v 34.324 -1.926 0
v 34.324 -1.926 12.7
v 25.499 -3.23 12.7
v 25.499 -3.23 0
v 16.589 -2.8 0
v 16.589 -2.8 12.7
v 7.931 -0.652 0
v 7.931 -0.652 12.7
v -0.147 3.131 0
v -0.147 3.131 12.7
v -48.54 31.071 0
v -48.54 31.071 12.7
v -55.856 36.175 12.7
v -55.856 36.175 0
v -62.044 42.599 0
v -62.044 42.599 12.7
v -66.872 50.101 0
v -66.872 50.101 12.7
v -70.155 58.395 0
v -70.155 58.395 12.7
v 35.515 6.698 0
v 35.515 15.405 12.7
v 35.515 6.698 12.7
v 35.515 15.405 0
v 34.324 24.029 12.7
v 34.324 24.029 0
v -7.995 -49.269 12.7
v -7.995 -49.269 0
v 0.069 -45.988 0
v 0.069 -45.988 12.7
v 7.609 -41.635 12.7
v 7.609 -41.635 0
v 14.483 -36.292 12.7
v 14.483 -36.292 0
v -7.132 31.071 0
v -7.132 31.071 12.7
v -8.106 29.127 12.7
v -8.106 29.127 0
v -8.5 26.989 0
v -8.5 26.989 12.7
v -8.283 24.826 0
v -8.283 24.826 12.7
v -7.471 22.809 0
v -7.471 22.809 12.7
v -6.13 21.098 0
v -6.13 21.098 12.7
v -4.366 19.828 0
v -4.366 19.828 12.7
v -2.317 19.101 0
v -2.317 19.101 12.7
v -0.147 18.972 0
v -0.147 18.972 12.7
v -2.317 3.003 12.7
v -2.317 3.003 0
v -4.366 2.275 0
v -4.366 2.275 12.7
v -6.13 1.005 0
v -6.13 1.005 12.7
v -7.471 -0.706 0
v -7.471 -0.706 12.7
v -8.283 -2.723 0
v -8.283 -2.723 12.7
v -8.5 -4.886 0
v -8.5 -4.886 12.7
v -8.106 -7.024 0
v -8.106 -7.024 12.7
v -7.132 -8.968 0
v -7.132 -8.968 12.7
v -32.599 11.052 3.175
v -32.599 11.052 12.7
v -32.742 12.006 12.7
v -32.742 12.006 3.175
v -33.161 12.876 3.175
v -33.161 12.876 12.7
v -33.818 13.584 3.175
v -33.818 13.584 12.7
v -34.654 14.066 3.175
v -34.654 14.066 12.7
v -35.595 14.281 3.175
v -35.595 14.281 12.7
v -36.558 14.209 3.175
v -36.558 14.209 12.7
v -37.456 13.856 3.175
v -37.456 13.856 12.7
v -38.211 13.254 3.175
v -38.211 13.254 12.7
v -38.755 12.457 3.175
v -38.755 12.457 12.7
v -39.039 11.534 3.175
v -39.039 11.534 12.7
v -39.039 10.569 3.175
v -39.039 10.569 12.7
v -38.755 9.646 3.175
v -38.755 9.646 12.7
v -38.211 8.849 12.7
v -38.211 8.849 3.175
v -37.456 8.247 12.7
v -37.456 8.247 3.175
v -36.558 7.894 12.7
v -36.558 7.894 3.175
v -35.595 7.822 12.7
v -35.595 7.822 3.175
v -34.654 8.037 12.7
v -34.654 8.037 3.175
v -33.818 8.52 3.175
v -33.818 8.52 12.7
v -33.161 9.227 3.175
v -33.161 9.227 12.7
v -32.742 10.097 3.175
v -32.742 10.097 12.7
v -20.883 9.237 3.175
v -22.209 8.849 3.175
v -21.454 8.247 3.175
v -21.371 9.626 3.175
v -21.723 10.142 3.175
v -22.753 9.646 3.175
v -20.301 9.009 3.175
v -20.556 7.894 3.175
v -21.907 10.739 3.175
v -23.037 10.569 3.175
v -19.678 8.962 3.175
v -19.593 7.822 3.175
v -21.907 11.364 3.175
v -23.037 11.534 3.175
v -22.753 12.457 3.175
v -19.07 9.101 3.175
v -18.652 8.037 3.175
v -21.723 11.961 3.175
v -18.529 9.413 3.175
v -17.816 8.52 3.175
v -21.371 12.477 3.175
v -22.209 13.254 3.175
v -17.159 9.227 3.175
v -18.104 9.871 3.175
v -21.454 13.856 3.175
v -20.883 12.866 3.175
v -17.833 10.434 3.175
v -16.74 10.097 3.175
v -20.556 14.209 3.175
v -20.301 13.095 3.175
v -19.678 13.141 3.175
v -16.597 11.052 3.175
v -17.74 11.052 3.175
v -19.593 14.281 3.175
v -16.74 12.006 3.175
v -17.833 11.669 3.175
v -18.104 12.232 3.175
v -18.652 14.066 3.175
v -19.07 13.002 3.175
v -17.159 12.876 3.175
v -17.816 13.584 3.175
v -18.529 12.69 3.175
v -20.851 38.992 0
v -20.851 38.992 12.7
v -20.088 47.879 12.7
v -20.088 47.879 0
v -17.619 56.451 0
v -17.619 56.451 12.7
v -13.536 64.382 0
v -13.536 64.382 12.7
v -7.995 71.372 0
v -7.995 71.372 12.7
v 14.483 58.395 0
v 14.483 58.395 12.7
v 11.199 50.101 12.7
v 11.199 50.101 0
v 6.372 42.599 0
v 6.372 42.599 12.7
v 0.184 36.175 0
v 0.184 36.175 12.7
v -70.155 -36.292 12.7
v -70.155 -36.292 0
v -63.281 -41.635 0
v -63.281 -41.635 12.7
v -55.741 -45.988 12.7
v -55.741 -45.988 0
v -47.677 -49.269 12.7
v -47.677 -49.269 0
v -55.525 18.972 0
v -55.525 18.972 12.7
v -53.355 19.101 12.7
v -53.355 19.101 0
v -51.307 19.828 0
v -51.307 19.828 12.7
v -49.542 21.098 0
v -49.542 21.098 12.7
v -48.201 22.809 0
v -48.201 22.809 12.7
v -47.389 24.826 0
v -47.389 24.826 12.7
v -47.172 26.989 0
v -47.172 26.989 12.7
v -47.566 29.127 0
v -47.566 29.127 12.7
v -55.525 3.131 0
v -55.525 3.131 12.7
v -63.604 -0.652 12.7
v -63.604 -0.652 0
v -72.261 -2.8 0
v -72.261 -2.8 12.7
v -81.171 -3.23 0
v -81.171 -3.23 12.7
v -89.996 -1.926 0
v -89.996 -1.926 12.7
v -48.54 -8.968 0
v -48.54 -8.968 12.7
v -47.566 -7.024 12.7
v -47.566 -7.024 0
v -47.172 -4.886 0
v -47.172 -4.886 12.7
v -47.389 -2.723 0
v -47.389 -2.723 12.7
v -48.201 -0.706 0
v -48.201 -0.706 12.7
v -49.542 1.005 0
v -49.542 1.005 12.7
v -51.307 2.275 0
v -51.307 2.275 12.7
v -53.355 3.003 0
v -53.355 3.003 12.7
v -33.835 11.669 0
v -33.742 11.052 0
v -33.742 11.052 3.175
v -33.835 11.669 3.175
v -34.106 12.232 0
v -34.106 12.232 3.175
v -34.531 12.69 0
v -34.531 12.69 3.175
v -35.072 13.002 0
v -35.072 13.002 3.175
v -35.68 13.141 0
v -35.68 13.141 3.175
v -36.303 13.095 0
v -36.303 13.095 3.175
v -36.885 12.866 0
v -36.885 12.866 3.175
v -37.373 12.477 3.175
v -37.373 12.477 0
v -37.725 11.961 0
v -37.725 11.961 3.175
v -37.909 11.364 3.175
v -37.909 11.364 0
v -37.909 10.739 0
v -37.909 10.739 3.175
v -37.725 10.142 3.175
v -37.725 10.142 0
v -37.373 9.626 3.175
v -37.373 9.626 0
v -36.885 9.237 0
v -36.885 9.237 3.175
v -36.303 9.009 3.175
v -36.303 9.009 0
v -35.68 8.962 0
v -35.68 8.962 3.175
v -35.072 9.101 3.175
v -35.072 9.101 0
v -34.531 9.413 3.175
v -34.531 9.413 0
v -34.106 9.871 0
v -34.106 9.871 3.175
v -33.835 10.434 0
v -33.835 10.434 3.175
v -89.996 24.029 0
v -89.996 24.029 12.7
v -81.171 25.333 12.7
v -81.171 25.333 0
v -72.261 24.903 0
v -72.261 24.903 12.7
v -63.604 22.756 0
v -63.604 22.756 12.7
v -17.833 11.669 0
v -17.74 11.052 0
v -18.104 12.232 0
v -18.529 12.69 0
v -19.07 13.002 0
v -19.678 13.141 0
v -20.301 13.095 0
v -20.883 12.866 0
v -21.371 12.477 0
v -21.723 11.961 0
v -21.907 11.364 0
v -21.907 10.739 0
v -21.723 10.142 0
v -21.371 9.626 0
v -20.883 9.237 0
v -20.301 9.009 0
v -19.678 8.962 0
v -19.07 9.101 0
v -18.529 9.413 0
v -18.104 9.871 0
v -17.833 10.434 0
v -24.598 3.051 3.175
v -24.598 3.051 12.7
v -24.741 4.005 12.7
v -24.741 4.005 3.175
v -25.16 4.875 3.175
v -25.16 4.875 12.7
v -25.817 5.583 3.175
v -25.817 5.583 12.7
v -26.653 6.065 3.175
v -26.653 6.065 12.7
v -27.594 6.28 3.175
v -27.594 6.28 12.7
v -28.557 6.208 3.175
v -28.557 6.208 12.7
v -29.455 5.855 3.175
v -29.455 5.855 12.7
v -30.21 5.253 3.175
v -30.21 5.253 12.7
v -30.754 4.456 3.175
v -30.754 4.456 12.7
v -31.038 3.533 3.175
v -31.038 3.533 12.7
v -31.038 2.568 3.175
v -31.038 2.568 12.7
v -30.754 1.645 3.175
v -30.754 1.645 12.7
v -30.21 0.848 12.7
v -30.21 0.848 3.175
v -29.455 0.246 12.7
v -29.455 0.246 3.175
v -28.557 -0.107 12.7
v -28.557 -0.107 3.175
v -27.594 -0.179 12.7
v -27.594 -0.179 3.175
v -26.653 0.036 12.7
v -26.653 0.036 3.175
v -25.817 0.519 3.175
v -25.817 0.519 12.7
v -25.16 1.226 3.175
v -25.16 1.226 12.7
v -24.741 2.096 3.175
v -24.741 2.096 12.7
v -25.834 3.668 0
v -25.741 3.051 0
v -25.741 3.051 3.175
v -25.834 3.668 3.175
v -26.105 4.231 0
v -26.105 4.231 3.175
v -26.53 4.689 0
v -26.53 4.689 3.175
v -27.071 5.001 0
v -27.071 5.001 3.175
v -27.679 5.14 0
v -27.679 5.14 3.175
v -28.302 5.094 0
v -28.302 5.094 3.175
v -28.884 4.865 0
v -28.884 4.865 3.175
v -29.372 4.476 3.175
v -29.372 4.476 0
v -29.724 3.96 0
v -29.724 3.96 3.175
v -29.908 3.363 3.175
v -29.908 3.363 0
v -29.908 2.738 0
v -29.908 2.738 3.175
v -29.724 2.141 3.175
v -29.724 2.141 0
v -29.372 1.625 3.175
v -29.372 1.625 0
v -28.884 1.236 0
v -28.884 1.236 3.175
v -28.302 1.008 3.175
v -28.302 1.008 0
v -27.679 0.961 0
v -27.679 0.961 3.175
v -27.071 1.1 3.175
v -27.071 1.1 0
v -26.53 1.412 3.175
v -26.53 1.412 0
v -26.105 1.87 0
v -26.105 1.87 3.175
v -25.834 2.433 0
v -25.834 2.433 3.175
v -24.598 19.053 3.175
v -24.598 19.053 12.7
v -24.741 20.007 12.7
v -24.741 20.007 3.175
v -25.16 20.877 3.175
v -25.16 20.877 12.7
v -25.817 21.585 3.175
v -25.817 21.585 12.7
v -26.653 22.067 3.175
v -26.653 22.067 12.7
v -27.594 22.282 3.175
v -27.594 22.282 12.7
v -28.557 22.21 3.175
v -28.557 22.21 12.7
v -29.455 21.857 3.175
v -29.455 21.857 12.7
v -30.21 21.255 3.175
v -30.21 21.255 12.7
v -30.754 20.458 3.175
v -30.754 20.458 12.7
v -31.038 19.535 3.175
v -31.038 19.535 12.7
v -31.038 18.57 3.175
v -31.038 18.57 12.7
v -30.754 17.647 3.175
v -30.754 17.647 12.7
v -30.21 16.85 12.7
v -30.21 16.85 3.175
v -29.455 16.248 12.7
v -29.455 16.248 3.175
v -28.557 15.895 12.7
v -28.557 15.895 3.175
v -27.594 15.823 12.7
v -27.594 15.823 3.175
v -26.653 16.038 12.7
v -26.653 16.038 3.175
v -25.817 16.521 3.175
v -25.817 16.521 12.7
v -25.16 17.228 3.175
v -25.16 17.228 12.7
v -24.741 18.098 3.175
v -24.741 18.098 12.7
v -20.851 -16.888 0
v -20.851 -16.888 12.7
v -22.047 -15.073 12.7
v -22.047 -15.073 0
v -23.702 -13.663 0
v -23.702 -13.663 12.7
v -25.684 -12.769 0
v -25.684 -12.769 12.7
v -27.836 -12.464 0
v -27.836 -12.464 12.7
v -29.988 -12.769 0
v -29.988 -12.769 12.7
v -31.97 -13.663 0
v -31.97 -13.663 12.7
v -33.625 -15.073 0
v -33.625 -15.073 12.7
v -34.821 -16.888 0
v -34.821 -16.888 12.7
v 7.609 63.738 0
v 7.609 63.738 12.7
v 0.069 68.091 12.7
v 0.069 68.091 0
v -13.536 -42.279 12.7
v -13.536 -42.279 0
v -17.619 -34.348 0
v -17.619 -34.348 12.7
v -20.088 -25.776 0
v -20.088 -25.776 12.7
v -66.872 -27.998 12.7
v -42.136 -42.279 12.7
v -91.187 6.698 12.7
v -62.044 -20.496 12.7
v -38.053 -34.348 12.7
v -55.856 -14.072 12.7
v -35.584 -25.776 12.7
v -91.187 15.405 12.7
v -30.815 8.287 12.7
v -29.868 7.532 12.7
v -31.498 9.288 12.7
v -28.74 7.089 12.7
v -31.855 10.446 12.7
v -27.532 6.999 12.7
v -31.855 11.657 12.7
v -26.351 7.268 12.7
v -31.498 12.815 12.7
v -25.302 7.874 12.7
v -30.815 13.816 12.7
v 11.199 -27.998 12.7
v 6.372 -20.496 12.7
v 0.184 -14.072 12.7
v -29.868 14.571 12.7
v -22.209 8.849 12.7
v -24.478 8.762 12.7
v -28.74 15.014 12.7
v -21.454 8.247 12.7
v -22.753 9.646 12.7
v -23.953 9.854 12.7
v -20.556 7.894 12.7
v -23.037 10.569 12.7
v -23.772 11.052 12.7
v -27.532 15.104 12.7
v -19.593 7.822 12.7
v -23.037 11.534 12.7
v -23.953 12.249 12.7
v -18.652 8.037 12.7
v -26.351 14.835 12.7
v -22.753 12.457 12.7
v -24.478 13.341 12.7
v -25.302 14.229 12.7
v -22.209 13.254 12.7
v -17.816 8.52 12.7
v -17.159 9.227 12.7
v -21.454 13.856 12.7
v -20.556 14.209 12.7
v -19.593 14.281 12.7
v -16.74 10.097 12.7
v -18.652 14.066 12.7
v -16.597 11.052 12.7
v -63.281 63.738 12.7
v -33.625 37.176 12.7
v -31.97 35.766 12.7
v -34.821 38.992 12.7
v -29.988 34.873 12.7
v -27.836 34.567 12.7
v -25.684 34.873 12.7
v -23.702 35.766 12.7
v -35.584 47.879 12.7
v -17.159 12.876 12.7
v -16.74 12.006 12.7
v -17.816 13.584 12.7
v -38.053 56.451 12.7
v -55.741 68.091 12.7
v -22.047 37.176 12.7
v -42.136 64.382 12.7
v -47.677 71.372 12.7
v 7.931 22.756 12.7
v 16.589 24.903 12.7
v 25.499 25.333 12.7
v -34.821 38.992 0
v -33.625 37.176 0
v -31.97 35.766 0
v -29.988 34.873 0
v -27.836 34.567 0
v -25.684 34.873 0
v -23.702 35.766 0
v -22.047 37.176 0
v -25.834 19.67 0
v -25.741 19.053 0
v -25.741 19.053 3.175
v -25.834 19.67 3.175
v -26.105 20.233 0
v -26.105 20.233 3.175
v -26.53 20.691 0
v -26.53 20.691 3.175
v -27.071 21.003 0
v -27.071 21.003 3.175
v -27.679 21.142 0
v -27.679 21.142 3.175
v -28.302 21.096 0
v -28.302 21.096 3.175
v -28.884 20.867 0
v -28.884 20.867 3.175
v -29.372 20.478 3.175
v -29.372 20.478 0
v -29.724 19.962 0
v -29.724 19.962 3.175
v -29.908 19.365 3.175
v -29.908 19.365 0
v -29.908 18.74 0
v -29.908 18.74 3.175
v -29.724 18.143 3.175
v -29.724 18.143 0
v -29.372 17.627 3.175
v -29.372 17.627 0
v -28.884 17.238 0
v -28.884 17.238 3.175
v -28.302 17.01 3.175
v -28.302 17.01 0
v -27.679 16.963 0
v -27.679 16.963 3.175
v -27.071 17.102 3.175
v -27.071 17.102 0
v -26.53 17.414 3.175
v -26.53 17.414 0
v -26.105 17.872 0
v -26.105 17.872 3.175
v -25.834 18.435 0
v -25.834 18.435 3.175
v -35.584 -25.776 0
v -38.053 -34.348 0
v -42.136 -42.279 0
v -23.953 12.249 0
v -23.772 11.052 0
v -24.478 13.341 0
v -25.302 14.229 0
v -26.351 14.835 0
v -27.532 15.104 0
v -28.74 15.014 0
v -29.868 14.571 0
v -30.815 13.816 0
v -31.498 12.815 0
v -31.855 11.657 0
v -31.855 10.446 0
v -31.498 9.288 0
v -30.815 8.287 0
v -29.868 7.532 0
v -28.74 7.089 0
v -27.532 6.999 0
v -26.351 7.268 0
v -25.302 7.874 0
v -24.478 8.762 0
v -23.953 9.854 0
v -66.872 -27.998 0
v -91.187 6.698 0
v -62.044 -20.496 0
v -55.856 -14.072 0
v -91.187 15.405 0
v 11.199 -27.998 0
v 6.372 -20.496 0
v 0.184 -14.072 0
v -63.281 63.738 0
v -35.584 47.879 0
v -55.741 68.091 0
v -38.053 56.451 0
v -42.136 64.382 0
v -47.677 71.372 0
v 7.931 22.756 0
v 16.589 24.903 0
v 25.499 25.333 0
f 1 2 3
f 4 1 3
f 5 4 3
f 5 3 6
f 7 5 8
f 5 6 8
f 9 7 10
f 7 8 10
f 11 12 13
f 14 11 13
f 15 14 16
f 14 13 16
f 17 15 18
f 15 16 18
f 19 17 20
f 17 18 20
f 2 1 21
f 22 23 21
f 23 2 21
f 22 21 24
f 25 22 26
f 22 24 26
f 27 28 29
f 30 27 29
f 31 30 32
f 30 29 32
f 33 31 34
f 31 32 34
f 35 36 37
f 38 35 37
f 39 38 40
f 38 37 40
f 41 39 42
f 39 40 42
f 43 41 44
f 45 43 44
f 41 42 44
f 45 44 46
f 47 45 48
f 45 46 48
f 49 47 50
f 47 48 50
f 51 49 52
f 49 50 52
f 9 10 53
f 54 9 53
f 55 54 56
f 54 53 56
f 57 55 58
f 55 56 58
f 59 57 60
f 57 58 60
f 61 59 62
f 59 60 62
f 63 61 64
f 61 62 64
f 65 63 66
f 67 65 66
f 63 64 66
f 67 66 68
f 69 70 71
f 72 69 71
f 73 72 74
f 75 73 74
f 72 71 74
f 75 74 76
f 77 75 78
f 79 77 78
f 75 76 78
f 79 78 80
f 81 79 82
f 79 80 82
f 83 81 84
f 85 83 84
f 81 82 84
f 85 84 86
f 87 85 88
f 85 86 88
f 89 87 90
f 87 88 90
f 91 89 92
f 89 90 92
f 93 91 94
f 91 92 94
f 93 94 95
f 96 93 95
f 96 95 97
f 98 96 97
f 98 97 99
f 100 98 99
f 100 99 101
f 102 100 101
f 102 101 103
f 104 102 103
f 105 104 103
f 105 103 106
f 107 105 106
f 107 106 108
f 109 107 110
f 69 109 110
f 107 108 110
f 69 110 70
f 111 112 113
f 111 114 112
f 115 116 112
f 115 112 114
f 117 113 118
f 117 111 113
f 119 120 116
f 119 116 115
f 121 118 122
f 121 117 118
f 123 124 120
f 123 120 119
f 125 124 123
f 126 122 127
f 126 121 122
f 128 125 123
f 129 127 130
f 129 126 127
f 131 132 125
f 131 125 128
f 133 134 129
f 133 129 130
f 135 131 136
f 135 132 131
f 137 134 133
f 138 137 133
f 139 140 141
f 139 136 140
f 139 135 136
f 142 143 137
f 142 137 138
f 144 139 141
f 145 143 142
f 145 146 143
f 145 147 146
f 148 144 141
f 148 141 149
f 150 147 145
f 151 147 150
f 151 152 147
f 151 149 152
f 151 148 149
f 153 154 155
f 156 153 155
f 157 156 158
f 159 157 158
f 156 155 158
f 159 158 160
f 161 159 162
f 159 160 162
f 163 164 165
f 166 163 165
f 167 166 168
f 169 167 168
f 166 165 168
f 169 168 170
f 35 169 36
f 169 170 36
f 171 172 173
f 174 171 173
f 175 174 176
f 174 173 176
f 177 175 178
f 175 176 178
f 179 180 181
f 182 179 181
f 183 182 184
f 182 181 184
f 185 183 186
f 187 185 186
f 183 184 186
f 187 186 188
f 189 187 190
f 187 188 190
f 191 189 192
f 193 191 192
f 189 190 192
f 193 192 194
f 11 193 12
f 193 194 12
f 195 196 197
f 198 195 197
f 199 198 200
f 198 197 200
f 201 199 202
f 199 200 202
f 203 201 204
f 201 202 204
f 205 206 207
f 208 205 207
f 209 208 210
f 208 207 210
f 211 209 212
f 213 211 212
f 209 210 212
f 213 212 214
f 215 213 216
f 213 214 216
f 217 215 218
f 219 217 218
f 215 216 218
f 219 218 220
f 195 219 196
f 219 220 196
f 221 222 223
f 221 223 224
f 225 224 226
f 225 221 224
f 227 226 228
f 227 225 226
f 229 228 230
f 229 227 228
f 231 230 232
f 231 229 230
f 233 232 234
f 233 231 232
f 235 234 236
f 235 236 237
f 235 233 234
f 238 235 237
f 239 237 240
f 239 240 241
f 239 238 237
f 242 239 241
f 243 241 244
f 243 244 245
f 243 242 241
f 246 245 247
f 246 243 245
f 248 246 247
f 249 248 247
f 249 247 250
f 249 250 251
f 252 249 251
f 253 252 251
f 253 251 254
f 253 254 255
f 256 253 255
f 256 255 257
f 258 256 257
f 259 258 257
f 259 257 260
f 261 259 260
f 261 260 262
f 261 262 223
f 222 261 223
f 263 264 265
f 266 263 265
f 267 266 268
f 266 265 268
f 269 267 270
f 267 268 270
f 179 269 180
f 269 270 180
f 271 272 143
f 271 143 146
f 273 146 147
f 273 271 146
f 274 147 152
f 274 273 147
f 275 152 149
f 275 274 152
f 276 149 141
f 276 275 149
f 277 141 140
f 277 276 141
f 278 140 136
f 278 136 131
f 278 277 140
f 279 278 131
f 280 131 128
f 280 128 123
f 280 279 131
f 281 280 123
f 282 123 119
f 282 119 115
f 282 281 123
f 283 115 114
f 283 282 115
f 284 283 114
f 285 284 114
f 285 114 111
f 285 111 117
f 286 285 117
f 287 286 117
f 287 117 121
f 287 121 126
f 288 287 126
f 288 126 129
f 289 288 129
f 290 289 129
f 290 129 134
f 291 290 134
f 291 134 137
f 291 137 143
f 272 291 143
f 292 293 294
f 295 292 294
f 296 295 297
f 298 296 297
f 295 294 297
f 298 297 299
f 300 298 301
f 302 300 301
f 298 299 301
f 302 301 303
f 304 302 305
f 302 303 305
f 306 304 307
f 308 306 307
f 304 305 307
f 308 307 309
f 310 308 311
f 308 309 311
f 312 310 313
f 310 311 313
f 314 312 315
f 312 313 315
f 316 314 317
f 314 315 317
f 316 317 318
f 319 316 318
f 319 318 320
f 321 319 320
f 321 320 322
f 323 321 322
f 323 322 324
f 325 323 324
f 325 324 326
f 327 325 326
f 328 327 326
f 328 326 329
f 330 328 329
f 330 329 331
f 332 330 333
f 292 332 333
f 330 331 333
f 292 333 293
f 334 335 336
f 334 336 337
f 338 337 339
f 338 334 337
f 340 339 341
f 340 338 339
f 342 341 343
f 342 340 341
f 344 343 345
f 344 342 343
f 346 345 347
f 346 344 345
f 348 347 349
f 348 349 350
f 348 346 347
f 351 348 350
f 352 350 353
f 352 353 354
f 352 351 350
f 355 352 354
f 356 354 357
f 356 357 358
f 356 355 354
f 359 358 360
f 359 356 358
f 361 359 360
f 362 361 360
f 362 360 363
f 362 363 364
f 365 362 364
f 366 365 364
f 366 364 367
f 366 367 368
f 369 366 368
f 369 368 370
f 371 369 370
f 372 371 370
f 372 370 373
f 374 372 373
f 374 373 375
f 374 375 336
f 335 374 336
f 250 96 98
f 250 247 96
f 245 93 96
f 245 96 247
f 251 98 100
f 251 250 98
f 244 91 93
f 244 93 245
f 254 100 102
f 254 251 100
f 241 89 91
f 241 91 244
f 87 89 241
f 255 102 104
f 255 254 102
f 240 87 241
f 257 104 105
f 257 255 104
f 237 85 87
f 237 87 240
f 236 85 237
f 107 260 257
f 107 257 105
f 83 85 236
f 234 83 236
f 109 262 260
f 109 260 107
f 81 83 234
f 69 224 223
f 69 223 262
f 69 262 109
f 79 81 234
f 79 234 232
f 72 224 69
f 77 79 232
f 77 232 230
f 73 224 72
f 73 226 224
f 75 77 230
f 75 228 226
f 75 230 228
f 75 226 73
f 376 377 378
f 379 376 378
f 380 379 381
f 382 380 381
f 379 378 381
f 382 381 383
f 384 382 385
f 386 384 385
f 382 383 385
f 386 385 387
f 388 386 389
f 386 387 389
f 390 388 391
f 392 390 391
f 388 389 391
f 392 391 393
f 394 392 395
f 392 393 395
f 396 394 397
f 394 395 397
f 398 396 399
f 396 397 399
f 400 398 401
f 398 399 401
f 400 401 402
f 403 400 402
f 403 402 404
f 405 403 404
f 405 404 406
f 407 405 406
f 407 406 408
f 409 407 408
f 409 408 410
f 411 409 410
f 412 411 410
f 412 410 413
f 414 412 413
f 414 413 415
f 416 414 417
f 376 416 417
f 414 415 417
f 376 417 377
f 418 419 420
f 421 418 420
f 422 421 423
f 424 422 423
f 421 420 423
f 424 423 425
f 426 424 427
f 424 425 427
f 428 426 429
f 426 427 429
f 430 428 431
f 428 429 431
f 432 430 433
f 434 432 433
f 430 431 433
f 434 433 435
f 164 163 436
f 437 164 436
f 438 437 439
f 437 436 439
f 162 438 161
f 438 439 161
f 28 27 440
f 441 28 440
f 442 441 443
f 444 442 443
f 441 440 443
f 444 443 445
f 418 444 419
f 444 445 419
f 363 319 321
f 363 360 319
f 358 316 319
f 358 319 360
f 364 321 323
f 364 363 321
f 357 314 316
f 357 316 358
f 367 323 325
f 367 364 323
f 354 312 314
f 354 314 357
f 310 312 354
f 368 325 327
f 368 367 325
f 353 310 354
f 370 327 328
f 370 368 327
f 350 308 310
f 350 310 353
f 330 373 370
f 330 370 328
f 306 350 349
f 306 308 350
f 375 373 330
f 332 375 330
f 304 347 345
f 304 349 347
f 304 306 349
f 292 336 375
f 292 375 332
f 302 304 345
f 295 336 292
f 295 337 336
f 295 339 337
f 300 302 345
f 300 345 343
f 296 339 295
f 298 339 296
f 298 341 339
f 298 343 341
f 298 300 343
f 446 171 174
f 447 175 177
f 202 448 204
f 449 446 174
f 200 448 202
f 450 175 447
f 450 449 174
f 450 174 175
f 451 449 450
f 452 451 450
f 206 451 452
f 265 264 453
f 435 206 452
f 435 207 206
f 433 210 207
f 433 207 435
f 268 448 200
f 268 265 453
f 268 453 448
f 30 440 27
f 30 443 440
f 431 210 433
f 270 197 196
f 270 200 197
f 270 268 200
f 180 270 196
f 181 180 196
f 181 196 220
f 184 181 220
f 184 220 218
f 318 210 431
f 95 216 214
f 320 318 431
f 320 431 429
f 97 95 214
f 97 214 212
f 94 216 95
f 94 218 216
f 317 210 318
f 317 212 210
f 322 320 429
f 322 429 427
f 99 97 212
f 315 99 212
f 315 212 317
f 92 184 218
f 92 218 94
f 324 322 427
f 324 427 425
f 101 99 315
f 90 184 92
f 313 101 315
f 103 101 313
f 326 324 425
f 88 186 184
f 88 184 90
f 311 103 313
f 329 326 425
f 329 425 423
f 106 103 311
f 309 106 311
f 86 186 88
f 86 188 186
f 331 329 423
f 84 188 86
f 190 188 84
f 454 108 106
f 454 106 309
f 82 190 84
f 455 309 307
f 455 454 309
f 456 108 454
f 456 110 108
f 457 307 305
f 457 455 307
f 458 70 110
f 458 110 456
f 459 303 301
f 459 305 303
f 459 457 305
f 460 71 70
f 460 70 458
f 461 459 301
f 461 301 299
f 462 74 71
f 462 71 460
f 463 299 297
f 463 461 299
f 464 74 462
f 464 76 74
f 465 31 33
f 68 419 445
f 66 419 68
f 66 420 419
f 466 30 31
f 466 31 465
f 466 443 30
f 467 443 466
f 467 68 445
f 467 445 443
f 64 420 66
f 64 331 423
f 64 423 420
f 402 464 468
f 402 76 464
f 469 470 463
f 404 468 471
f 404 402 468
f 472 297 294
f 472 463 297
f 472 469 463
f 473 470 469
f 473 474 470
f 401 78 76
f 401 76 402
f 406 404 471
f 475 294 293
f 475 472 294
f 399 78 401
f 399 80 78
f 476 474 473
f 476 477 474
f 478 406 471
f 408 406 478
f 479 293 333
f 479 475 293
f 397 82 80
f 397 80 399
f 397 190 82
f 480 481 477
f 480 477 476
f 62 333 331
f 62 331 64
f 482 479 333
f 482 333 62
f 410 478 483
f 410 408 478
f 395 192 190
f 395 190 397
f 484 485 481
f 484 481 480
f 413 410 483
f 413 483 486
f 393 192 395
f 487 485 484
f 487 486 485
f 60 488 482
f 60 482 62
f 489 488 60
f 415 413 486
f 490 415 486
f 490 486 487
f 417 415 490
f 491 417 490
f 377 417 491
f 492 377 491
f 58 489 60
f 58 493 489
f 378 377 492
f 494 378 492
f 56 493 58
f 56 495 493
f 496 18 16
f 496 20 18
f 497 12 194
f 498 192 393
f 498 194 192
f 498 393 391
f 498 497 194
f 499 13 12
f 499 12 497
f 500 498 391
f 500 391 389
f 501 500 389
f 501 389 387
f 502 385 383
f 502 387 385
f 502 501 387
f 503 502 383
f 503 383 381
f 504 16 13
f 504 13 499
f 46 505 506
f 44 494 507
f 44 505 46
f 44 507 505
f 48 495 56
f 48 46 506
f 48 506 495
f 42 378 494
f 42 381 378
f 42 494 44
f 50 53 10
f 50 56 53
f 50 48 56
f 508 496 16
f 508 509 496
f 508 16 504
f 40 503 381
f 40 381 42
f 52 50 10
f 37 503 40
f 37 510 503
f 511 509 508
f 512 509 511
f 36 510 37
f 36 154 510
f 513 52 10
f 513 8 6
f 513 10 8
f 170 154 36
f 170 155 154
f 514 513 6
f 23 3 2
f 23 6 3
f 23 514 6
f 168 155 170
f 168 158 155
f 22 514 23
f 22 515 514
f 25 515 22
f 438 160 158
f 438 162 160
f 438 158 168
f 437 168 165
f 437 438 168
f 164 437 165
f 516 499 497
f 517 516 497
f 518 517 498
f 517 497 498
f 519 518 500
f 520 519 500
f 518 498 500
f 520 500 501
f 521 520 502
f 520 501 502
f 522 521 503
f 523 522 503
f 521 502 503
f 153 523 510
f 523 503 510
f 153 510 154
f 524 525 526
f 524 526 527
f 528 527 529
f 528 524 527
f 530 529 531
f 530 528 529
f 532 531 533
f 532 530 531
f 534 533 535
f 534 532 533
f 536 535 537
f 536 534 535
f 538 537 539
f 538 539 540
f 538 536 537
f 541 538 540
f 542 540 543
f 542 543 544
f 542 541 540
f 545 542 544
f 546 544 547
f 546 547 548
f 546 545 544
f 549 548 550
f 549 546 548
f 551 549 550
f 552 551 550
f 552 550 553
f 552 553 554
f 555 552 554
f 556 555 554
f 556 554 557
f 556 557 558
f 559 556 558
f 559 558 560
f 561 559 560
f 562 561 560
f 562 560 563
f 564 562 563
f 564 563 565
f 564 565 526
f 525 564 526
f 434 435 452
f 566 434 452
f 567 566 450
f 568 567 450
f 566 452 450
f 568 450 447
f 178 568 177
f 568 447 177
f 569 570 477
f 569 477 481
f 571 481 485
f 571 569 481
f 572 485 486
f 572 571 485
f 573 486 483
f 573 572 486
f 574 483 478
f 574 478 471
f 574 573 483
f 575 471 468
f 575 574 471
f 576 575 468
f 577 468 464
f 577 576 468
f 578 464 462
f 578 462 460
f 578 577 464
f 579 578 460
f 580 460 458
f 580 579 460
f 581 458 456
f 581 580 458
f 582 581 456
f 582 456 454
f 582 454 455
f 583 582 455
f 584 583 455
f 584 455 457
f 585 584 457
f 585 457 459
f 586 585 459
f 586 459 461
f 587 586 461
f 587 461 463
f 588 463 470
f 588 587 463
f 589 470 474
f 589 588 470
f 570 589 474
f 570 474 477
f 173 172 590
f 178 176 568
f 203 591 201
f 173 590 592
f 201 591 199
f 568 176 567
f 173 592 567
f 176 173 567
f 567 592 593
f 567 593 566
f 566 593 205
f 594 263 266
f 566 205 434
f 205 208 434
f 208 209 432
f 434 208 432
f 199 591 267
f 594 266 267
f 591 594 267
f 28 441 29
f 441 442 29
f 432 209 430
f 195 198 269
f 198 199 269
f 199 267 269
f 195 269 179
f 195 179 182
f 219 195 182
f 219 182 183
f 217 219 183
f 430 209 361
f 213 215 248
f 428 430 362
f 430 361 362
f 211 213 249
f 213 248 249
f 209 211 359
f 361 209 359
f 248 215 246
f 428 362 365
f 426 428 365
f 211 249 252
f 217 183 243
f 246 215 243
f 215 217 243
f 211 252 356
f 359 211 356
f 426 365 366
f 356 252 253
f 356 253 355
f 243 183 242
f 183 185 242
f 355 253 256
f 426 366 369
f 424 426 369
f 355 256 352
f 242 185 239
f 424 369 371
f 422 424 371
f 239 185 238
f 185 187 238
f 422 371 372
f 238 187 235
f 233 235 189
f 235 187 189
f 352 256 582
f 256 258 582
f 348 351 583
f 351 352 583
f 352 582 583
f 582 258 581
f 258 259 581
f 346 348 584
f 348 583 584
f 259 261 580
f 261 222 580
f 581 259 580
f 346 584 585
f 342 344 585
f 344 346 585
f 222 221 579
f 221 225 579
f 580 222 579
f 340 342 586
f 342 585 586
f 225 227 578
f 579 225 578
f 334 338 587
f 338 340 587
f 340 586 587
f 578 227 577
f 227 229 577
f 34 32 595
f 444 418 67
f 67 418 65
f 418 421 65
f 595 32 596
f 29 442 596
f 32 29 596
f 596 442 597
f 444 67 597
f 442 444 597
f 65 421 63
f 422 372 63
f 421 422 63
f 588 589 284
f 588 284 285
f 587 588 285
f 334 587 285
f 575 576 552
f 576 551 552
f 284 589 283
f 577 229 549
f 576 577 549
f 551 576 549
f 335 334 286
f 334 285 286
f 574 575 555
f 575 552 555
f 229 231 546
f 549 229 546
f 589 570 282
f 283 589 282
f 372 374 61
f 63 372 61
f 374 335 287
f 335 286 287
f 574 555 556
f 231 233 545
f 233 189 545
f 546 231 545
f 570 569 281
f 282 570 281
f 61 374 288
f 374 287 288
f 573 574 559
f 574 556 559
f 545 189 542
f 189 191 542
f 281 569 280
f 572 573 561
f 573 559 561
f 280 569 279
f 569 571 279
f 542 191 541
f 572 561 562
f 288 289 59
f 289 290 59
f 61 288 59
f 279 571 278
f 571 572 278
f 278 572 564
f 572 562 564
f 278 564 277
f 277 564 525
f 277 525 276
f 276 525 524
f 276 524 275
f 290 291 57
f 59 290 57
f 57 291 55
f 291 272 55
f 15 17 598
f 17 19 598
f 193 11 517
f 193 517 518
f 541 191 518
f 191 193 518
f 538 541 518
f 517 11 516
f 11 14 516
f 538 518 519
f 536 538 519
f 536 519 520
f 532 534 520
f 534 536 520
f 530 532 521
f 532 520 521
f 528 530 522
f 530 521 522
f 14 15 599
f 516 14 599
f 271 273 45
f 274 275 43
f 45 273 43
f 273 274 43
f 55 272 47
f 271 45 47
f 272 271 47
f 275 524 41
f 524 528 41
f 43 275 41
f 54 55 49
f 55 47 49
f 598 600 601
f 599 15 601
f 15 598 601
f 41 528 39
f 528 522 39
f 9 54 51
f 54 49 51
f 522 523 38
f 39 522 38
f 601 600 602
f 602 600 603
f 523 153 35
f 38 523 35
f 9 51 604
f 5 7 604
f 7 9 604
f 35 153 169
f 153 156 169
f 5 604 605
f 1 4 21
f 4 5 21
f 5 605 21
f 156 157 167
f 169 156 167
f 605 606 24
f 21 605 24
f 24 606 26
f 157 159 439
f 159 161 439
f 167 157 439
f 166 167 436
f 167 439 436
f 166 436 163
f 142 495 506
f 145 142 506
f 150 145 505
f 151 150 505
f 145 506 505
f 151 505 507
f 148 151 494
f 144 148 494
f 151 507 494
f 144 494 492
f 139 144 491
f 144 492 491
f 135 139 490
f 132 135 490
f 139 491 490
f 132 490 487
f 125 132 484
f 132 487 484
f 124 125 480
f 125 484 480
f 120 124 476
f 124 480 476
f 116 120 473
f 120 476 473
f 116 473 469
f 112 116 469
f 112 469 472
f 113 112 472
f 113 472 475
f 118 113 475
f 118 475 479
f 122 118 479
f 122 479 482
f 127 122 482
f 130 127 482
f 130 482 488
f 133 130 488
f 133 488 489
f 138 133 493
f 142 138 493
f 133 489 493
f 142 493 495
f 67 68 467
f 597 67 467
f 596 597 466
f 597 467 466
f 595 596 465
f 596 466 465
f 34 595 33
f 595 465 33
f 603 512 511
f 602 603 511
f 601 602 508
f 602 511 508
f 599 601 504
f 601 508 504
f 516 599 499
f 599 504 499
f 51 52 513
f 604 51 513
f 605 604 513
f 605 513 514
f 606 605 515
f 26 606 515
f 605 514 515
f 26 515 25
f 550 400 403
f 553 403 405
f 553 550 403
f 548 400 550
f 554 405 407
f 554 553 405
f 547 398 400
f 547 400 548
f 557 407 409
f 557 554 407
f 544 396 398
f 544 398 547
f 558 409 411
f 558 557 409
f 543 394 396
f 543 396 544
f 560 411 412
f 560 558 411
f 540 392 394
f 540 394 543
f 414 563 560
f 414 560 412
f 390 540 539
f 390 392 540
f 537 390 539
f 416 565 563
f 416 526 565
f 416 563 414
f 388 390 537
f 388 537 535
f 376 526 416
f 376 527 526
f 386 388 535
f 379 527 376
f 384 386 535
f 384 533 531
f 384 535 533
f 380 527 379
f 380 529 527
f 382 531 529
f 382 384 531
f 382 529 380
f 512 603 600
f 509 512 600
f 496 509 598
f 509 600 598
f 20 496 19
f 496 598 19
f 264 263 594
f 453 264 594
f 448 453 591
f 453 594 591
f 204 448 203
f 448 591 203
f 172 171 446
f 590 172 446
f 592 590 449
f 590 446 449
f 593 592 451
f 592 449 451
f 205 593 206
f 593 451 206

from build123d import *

# Parameters (mm, degrees)
F0_R     = 63.5
F0_R_2   = 2.0955
F0_R_3   = 4.064
F1_DEPTH = 12.7
F3_DEPTH = 12.7
F2_R     = 3.2385
F2_R_2   = 2.0955
F4_DEPTH = 9.525


with BuildPart() as f1:
    # F0 (on Top) → F1 (new body)
    with BuildSketch(Plane.XY):
        with Locations((-27.8360728791, 11.0515514389)):
            Circle(F0_R)
        with Locations((-27.8360728791, 3.0505514389)):
            Circle(F0_R_2, mode=Mode.SUBTRACT)
        with Locations((-35.8370728791, 11.0515514389)):
            Circle(F0_R_2, mode=Mode.SUBTRACT)
        with Locations((-27.8360728791, 11.0515514389)):
            Circle(F0_R_3, mode=Mode.SUBTRACT)
        with Locations((-19.8350728791, 11.0515514389)):
            Circle(F0_R_2, mode=Mode.SUBTRACT)
        with Locations((-27.8360728791, 19.0525514389)):
            Circle(F0_R_2, mode=Mode.SUBTRACT)
    extrude(amount=F1_DEPTH)

    # F2 (on face) → F3 (cut)
    with BuildSketch(Plane.XY.offset(12.7)):
        with BuildLine():
            ThreePointArc((-48.5403226608, 31.0707388843), (-62.0442946523, 42.5994874775), (-70.1548226491, 58.3946968551))
            ThreePointArc((-70.1548226491, 58.3946968551), (-82.8286860194, 42.8015514389), (-89.9958143896, 24.029091088))
            ThreePointArc((-89.9958143896, 24.029091088), (-72.2614978121, 24.9027724934), (-55.5253226608, 18.9723639934))
            ThreePointArc((-55.5253226608, 18.9723639934), (-48.2007234403, 22.8090879223), (-48.5403226608, 31.0707388843))
        make_face()
        with BuildLine():
            ThreePointArc((-20.8510728791, 38.9915514389), (-17.6188697193, 56.450708532), (-7.9950811385, 71.3722365042))
            ThreePointArc((-7.9950811385, 71.3722365042), (-27.8360728791, 74.5515514389), (-47.6770646196, 71.3722365042))
            ThreePointArc((-47.6770646196, 71.3722365042), (-38.0532760389, 56.450708532), (-34.8210728791, 38.9915514389))
            ThreePointArc((-34.8210728791, 38.9915514389), (-27.8360728791, 34.5666244058), (-20.8510728791, 38.9915514389))
        make_face()
        with BuildLine():
            ThreePointArc((34.3236686315, 24.029091088), (27.1565402612, 42.8015514389), (14.4826768909, 58.3946968551))
            ThreePointArc((14.4826768909, 58.3946968551), (6.3721488941, 42.5994874775), (-7.1318230973, 31.0707388843))
            ThreePointArc((-7.1318230973, 31.0707388843), (-7.4714223178, 22.8090879223), (-0.1468230973, 18.9723639934))
            ThreePointArc((-0.1468230973, 18.9723639934), (16.5893520539, 24.9027724934), (34.3236686315, 24.029091088))
        make_face()
        with BuildLine():
            ThreePointArc((14.4826768909, -36.2915939774), (27.1565402612, -20.6984485611), (34.3236686315, -1.9259882102))
            ThreePointArc((34.3236686315, -1.9259882102), (16.5893520539, -2.7996696157), (-0.1468230973, 3.1307388843))
            ThreePointArc((-0.1468230973, 3.1307388843), (-7.4714223178, -0.7059850446), (-7.1318230973, -8.9676360066))
            ThreePointArc((-7.1318230973, -8.9676360066), (6.3721488941, -20.4963845997), (14.4826768909, -36.2915939774))
        make_face()
        with BuildLine():
            ThreePointArc((-47.6770646196, -49.2691336265), (-27.8360728791, -52.4484485611), (-7.9950811385, -49.2691336265))
            ThreePointArc((-7.9950811385, -49.2691336265), (-17.6188697193, -34.3476056543), (-20.8510728791, -16.8884485611))
            ThreePointArc((-20.8510728791, -16.8884485611), (-27.8360728791, -12.4635215281), (-34.8210728791, -16.8884485611))
            ThreePointArc((-34.8210728791, -16.8884485611), (-38.0532760389, -34.3476056543), (-47.6770646196, -49.2691336265))
        make_face()
        with BuildLine():
            ThreePointArc((-55.5253226608, 3.1307388843), (-72.2614978121, -2.7996696157), (-89.9958143896, -1.9259882102))
            ThreePointArc((-89.9958143896, -1.9259882102), (-82.8286860194, -20.6984485611), (-70.1548226491, -36.2915939774))
            ThreePointArc((-70.1548226491, -36.2915939774), (-62.0442946523, -20.4963845997), (-48.5403226608, -8.9676360066))
            ThreePointArc((-48.5403226608, -8.9676360066), (-48.2007234403, -0.7059850446), (-55.5253226608, 3.1307388843))
        make_face()
    extrude(amount=-F3_DEPTH, mode=Mode.SUBTRACT)

    # F2 (on face) → F4 (cut)
    with BuildSketch(Plane.XY.offset(12.7)):
        with Locations((-27.8360728791, 19.0525514389)):
            Circle(F2_R)
        with Locations((-27.8360728791, 19.0525514389)):
            Circle(F2_R_2, mode=Mode.SUBTRACT)
        with Locations((-19.8350728791, 11.0515514389)):
            Circle(F2_R)
        with Locations((-19.8350728791, 11.0515514389)):
            Circle(F2_R_2, mode=Mode.SUBTRACT)
        with Locations((-27.8360728791, 3.0505514389)):
            Circle(F2_R)
        with Locations((-27.8360728791, 3.0505514389)):
            Circle(F2_R_2, mode=Mode.SUBTRACT)
        with Locations((-35.8370728791, 11.0515514389)):
            Circle(F2_R)
        with Locations((-35.8370728791, 11.0515514389)):
            Circle(F2_R_2, mode=Mode.SUBTRACT)
    extrude(amount=-F4_DEPTH, mode=Mode.SUBTRACT)


solid = f1.part
